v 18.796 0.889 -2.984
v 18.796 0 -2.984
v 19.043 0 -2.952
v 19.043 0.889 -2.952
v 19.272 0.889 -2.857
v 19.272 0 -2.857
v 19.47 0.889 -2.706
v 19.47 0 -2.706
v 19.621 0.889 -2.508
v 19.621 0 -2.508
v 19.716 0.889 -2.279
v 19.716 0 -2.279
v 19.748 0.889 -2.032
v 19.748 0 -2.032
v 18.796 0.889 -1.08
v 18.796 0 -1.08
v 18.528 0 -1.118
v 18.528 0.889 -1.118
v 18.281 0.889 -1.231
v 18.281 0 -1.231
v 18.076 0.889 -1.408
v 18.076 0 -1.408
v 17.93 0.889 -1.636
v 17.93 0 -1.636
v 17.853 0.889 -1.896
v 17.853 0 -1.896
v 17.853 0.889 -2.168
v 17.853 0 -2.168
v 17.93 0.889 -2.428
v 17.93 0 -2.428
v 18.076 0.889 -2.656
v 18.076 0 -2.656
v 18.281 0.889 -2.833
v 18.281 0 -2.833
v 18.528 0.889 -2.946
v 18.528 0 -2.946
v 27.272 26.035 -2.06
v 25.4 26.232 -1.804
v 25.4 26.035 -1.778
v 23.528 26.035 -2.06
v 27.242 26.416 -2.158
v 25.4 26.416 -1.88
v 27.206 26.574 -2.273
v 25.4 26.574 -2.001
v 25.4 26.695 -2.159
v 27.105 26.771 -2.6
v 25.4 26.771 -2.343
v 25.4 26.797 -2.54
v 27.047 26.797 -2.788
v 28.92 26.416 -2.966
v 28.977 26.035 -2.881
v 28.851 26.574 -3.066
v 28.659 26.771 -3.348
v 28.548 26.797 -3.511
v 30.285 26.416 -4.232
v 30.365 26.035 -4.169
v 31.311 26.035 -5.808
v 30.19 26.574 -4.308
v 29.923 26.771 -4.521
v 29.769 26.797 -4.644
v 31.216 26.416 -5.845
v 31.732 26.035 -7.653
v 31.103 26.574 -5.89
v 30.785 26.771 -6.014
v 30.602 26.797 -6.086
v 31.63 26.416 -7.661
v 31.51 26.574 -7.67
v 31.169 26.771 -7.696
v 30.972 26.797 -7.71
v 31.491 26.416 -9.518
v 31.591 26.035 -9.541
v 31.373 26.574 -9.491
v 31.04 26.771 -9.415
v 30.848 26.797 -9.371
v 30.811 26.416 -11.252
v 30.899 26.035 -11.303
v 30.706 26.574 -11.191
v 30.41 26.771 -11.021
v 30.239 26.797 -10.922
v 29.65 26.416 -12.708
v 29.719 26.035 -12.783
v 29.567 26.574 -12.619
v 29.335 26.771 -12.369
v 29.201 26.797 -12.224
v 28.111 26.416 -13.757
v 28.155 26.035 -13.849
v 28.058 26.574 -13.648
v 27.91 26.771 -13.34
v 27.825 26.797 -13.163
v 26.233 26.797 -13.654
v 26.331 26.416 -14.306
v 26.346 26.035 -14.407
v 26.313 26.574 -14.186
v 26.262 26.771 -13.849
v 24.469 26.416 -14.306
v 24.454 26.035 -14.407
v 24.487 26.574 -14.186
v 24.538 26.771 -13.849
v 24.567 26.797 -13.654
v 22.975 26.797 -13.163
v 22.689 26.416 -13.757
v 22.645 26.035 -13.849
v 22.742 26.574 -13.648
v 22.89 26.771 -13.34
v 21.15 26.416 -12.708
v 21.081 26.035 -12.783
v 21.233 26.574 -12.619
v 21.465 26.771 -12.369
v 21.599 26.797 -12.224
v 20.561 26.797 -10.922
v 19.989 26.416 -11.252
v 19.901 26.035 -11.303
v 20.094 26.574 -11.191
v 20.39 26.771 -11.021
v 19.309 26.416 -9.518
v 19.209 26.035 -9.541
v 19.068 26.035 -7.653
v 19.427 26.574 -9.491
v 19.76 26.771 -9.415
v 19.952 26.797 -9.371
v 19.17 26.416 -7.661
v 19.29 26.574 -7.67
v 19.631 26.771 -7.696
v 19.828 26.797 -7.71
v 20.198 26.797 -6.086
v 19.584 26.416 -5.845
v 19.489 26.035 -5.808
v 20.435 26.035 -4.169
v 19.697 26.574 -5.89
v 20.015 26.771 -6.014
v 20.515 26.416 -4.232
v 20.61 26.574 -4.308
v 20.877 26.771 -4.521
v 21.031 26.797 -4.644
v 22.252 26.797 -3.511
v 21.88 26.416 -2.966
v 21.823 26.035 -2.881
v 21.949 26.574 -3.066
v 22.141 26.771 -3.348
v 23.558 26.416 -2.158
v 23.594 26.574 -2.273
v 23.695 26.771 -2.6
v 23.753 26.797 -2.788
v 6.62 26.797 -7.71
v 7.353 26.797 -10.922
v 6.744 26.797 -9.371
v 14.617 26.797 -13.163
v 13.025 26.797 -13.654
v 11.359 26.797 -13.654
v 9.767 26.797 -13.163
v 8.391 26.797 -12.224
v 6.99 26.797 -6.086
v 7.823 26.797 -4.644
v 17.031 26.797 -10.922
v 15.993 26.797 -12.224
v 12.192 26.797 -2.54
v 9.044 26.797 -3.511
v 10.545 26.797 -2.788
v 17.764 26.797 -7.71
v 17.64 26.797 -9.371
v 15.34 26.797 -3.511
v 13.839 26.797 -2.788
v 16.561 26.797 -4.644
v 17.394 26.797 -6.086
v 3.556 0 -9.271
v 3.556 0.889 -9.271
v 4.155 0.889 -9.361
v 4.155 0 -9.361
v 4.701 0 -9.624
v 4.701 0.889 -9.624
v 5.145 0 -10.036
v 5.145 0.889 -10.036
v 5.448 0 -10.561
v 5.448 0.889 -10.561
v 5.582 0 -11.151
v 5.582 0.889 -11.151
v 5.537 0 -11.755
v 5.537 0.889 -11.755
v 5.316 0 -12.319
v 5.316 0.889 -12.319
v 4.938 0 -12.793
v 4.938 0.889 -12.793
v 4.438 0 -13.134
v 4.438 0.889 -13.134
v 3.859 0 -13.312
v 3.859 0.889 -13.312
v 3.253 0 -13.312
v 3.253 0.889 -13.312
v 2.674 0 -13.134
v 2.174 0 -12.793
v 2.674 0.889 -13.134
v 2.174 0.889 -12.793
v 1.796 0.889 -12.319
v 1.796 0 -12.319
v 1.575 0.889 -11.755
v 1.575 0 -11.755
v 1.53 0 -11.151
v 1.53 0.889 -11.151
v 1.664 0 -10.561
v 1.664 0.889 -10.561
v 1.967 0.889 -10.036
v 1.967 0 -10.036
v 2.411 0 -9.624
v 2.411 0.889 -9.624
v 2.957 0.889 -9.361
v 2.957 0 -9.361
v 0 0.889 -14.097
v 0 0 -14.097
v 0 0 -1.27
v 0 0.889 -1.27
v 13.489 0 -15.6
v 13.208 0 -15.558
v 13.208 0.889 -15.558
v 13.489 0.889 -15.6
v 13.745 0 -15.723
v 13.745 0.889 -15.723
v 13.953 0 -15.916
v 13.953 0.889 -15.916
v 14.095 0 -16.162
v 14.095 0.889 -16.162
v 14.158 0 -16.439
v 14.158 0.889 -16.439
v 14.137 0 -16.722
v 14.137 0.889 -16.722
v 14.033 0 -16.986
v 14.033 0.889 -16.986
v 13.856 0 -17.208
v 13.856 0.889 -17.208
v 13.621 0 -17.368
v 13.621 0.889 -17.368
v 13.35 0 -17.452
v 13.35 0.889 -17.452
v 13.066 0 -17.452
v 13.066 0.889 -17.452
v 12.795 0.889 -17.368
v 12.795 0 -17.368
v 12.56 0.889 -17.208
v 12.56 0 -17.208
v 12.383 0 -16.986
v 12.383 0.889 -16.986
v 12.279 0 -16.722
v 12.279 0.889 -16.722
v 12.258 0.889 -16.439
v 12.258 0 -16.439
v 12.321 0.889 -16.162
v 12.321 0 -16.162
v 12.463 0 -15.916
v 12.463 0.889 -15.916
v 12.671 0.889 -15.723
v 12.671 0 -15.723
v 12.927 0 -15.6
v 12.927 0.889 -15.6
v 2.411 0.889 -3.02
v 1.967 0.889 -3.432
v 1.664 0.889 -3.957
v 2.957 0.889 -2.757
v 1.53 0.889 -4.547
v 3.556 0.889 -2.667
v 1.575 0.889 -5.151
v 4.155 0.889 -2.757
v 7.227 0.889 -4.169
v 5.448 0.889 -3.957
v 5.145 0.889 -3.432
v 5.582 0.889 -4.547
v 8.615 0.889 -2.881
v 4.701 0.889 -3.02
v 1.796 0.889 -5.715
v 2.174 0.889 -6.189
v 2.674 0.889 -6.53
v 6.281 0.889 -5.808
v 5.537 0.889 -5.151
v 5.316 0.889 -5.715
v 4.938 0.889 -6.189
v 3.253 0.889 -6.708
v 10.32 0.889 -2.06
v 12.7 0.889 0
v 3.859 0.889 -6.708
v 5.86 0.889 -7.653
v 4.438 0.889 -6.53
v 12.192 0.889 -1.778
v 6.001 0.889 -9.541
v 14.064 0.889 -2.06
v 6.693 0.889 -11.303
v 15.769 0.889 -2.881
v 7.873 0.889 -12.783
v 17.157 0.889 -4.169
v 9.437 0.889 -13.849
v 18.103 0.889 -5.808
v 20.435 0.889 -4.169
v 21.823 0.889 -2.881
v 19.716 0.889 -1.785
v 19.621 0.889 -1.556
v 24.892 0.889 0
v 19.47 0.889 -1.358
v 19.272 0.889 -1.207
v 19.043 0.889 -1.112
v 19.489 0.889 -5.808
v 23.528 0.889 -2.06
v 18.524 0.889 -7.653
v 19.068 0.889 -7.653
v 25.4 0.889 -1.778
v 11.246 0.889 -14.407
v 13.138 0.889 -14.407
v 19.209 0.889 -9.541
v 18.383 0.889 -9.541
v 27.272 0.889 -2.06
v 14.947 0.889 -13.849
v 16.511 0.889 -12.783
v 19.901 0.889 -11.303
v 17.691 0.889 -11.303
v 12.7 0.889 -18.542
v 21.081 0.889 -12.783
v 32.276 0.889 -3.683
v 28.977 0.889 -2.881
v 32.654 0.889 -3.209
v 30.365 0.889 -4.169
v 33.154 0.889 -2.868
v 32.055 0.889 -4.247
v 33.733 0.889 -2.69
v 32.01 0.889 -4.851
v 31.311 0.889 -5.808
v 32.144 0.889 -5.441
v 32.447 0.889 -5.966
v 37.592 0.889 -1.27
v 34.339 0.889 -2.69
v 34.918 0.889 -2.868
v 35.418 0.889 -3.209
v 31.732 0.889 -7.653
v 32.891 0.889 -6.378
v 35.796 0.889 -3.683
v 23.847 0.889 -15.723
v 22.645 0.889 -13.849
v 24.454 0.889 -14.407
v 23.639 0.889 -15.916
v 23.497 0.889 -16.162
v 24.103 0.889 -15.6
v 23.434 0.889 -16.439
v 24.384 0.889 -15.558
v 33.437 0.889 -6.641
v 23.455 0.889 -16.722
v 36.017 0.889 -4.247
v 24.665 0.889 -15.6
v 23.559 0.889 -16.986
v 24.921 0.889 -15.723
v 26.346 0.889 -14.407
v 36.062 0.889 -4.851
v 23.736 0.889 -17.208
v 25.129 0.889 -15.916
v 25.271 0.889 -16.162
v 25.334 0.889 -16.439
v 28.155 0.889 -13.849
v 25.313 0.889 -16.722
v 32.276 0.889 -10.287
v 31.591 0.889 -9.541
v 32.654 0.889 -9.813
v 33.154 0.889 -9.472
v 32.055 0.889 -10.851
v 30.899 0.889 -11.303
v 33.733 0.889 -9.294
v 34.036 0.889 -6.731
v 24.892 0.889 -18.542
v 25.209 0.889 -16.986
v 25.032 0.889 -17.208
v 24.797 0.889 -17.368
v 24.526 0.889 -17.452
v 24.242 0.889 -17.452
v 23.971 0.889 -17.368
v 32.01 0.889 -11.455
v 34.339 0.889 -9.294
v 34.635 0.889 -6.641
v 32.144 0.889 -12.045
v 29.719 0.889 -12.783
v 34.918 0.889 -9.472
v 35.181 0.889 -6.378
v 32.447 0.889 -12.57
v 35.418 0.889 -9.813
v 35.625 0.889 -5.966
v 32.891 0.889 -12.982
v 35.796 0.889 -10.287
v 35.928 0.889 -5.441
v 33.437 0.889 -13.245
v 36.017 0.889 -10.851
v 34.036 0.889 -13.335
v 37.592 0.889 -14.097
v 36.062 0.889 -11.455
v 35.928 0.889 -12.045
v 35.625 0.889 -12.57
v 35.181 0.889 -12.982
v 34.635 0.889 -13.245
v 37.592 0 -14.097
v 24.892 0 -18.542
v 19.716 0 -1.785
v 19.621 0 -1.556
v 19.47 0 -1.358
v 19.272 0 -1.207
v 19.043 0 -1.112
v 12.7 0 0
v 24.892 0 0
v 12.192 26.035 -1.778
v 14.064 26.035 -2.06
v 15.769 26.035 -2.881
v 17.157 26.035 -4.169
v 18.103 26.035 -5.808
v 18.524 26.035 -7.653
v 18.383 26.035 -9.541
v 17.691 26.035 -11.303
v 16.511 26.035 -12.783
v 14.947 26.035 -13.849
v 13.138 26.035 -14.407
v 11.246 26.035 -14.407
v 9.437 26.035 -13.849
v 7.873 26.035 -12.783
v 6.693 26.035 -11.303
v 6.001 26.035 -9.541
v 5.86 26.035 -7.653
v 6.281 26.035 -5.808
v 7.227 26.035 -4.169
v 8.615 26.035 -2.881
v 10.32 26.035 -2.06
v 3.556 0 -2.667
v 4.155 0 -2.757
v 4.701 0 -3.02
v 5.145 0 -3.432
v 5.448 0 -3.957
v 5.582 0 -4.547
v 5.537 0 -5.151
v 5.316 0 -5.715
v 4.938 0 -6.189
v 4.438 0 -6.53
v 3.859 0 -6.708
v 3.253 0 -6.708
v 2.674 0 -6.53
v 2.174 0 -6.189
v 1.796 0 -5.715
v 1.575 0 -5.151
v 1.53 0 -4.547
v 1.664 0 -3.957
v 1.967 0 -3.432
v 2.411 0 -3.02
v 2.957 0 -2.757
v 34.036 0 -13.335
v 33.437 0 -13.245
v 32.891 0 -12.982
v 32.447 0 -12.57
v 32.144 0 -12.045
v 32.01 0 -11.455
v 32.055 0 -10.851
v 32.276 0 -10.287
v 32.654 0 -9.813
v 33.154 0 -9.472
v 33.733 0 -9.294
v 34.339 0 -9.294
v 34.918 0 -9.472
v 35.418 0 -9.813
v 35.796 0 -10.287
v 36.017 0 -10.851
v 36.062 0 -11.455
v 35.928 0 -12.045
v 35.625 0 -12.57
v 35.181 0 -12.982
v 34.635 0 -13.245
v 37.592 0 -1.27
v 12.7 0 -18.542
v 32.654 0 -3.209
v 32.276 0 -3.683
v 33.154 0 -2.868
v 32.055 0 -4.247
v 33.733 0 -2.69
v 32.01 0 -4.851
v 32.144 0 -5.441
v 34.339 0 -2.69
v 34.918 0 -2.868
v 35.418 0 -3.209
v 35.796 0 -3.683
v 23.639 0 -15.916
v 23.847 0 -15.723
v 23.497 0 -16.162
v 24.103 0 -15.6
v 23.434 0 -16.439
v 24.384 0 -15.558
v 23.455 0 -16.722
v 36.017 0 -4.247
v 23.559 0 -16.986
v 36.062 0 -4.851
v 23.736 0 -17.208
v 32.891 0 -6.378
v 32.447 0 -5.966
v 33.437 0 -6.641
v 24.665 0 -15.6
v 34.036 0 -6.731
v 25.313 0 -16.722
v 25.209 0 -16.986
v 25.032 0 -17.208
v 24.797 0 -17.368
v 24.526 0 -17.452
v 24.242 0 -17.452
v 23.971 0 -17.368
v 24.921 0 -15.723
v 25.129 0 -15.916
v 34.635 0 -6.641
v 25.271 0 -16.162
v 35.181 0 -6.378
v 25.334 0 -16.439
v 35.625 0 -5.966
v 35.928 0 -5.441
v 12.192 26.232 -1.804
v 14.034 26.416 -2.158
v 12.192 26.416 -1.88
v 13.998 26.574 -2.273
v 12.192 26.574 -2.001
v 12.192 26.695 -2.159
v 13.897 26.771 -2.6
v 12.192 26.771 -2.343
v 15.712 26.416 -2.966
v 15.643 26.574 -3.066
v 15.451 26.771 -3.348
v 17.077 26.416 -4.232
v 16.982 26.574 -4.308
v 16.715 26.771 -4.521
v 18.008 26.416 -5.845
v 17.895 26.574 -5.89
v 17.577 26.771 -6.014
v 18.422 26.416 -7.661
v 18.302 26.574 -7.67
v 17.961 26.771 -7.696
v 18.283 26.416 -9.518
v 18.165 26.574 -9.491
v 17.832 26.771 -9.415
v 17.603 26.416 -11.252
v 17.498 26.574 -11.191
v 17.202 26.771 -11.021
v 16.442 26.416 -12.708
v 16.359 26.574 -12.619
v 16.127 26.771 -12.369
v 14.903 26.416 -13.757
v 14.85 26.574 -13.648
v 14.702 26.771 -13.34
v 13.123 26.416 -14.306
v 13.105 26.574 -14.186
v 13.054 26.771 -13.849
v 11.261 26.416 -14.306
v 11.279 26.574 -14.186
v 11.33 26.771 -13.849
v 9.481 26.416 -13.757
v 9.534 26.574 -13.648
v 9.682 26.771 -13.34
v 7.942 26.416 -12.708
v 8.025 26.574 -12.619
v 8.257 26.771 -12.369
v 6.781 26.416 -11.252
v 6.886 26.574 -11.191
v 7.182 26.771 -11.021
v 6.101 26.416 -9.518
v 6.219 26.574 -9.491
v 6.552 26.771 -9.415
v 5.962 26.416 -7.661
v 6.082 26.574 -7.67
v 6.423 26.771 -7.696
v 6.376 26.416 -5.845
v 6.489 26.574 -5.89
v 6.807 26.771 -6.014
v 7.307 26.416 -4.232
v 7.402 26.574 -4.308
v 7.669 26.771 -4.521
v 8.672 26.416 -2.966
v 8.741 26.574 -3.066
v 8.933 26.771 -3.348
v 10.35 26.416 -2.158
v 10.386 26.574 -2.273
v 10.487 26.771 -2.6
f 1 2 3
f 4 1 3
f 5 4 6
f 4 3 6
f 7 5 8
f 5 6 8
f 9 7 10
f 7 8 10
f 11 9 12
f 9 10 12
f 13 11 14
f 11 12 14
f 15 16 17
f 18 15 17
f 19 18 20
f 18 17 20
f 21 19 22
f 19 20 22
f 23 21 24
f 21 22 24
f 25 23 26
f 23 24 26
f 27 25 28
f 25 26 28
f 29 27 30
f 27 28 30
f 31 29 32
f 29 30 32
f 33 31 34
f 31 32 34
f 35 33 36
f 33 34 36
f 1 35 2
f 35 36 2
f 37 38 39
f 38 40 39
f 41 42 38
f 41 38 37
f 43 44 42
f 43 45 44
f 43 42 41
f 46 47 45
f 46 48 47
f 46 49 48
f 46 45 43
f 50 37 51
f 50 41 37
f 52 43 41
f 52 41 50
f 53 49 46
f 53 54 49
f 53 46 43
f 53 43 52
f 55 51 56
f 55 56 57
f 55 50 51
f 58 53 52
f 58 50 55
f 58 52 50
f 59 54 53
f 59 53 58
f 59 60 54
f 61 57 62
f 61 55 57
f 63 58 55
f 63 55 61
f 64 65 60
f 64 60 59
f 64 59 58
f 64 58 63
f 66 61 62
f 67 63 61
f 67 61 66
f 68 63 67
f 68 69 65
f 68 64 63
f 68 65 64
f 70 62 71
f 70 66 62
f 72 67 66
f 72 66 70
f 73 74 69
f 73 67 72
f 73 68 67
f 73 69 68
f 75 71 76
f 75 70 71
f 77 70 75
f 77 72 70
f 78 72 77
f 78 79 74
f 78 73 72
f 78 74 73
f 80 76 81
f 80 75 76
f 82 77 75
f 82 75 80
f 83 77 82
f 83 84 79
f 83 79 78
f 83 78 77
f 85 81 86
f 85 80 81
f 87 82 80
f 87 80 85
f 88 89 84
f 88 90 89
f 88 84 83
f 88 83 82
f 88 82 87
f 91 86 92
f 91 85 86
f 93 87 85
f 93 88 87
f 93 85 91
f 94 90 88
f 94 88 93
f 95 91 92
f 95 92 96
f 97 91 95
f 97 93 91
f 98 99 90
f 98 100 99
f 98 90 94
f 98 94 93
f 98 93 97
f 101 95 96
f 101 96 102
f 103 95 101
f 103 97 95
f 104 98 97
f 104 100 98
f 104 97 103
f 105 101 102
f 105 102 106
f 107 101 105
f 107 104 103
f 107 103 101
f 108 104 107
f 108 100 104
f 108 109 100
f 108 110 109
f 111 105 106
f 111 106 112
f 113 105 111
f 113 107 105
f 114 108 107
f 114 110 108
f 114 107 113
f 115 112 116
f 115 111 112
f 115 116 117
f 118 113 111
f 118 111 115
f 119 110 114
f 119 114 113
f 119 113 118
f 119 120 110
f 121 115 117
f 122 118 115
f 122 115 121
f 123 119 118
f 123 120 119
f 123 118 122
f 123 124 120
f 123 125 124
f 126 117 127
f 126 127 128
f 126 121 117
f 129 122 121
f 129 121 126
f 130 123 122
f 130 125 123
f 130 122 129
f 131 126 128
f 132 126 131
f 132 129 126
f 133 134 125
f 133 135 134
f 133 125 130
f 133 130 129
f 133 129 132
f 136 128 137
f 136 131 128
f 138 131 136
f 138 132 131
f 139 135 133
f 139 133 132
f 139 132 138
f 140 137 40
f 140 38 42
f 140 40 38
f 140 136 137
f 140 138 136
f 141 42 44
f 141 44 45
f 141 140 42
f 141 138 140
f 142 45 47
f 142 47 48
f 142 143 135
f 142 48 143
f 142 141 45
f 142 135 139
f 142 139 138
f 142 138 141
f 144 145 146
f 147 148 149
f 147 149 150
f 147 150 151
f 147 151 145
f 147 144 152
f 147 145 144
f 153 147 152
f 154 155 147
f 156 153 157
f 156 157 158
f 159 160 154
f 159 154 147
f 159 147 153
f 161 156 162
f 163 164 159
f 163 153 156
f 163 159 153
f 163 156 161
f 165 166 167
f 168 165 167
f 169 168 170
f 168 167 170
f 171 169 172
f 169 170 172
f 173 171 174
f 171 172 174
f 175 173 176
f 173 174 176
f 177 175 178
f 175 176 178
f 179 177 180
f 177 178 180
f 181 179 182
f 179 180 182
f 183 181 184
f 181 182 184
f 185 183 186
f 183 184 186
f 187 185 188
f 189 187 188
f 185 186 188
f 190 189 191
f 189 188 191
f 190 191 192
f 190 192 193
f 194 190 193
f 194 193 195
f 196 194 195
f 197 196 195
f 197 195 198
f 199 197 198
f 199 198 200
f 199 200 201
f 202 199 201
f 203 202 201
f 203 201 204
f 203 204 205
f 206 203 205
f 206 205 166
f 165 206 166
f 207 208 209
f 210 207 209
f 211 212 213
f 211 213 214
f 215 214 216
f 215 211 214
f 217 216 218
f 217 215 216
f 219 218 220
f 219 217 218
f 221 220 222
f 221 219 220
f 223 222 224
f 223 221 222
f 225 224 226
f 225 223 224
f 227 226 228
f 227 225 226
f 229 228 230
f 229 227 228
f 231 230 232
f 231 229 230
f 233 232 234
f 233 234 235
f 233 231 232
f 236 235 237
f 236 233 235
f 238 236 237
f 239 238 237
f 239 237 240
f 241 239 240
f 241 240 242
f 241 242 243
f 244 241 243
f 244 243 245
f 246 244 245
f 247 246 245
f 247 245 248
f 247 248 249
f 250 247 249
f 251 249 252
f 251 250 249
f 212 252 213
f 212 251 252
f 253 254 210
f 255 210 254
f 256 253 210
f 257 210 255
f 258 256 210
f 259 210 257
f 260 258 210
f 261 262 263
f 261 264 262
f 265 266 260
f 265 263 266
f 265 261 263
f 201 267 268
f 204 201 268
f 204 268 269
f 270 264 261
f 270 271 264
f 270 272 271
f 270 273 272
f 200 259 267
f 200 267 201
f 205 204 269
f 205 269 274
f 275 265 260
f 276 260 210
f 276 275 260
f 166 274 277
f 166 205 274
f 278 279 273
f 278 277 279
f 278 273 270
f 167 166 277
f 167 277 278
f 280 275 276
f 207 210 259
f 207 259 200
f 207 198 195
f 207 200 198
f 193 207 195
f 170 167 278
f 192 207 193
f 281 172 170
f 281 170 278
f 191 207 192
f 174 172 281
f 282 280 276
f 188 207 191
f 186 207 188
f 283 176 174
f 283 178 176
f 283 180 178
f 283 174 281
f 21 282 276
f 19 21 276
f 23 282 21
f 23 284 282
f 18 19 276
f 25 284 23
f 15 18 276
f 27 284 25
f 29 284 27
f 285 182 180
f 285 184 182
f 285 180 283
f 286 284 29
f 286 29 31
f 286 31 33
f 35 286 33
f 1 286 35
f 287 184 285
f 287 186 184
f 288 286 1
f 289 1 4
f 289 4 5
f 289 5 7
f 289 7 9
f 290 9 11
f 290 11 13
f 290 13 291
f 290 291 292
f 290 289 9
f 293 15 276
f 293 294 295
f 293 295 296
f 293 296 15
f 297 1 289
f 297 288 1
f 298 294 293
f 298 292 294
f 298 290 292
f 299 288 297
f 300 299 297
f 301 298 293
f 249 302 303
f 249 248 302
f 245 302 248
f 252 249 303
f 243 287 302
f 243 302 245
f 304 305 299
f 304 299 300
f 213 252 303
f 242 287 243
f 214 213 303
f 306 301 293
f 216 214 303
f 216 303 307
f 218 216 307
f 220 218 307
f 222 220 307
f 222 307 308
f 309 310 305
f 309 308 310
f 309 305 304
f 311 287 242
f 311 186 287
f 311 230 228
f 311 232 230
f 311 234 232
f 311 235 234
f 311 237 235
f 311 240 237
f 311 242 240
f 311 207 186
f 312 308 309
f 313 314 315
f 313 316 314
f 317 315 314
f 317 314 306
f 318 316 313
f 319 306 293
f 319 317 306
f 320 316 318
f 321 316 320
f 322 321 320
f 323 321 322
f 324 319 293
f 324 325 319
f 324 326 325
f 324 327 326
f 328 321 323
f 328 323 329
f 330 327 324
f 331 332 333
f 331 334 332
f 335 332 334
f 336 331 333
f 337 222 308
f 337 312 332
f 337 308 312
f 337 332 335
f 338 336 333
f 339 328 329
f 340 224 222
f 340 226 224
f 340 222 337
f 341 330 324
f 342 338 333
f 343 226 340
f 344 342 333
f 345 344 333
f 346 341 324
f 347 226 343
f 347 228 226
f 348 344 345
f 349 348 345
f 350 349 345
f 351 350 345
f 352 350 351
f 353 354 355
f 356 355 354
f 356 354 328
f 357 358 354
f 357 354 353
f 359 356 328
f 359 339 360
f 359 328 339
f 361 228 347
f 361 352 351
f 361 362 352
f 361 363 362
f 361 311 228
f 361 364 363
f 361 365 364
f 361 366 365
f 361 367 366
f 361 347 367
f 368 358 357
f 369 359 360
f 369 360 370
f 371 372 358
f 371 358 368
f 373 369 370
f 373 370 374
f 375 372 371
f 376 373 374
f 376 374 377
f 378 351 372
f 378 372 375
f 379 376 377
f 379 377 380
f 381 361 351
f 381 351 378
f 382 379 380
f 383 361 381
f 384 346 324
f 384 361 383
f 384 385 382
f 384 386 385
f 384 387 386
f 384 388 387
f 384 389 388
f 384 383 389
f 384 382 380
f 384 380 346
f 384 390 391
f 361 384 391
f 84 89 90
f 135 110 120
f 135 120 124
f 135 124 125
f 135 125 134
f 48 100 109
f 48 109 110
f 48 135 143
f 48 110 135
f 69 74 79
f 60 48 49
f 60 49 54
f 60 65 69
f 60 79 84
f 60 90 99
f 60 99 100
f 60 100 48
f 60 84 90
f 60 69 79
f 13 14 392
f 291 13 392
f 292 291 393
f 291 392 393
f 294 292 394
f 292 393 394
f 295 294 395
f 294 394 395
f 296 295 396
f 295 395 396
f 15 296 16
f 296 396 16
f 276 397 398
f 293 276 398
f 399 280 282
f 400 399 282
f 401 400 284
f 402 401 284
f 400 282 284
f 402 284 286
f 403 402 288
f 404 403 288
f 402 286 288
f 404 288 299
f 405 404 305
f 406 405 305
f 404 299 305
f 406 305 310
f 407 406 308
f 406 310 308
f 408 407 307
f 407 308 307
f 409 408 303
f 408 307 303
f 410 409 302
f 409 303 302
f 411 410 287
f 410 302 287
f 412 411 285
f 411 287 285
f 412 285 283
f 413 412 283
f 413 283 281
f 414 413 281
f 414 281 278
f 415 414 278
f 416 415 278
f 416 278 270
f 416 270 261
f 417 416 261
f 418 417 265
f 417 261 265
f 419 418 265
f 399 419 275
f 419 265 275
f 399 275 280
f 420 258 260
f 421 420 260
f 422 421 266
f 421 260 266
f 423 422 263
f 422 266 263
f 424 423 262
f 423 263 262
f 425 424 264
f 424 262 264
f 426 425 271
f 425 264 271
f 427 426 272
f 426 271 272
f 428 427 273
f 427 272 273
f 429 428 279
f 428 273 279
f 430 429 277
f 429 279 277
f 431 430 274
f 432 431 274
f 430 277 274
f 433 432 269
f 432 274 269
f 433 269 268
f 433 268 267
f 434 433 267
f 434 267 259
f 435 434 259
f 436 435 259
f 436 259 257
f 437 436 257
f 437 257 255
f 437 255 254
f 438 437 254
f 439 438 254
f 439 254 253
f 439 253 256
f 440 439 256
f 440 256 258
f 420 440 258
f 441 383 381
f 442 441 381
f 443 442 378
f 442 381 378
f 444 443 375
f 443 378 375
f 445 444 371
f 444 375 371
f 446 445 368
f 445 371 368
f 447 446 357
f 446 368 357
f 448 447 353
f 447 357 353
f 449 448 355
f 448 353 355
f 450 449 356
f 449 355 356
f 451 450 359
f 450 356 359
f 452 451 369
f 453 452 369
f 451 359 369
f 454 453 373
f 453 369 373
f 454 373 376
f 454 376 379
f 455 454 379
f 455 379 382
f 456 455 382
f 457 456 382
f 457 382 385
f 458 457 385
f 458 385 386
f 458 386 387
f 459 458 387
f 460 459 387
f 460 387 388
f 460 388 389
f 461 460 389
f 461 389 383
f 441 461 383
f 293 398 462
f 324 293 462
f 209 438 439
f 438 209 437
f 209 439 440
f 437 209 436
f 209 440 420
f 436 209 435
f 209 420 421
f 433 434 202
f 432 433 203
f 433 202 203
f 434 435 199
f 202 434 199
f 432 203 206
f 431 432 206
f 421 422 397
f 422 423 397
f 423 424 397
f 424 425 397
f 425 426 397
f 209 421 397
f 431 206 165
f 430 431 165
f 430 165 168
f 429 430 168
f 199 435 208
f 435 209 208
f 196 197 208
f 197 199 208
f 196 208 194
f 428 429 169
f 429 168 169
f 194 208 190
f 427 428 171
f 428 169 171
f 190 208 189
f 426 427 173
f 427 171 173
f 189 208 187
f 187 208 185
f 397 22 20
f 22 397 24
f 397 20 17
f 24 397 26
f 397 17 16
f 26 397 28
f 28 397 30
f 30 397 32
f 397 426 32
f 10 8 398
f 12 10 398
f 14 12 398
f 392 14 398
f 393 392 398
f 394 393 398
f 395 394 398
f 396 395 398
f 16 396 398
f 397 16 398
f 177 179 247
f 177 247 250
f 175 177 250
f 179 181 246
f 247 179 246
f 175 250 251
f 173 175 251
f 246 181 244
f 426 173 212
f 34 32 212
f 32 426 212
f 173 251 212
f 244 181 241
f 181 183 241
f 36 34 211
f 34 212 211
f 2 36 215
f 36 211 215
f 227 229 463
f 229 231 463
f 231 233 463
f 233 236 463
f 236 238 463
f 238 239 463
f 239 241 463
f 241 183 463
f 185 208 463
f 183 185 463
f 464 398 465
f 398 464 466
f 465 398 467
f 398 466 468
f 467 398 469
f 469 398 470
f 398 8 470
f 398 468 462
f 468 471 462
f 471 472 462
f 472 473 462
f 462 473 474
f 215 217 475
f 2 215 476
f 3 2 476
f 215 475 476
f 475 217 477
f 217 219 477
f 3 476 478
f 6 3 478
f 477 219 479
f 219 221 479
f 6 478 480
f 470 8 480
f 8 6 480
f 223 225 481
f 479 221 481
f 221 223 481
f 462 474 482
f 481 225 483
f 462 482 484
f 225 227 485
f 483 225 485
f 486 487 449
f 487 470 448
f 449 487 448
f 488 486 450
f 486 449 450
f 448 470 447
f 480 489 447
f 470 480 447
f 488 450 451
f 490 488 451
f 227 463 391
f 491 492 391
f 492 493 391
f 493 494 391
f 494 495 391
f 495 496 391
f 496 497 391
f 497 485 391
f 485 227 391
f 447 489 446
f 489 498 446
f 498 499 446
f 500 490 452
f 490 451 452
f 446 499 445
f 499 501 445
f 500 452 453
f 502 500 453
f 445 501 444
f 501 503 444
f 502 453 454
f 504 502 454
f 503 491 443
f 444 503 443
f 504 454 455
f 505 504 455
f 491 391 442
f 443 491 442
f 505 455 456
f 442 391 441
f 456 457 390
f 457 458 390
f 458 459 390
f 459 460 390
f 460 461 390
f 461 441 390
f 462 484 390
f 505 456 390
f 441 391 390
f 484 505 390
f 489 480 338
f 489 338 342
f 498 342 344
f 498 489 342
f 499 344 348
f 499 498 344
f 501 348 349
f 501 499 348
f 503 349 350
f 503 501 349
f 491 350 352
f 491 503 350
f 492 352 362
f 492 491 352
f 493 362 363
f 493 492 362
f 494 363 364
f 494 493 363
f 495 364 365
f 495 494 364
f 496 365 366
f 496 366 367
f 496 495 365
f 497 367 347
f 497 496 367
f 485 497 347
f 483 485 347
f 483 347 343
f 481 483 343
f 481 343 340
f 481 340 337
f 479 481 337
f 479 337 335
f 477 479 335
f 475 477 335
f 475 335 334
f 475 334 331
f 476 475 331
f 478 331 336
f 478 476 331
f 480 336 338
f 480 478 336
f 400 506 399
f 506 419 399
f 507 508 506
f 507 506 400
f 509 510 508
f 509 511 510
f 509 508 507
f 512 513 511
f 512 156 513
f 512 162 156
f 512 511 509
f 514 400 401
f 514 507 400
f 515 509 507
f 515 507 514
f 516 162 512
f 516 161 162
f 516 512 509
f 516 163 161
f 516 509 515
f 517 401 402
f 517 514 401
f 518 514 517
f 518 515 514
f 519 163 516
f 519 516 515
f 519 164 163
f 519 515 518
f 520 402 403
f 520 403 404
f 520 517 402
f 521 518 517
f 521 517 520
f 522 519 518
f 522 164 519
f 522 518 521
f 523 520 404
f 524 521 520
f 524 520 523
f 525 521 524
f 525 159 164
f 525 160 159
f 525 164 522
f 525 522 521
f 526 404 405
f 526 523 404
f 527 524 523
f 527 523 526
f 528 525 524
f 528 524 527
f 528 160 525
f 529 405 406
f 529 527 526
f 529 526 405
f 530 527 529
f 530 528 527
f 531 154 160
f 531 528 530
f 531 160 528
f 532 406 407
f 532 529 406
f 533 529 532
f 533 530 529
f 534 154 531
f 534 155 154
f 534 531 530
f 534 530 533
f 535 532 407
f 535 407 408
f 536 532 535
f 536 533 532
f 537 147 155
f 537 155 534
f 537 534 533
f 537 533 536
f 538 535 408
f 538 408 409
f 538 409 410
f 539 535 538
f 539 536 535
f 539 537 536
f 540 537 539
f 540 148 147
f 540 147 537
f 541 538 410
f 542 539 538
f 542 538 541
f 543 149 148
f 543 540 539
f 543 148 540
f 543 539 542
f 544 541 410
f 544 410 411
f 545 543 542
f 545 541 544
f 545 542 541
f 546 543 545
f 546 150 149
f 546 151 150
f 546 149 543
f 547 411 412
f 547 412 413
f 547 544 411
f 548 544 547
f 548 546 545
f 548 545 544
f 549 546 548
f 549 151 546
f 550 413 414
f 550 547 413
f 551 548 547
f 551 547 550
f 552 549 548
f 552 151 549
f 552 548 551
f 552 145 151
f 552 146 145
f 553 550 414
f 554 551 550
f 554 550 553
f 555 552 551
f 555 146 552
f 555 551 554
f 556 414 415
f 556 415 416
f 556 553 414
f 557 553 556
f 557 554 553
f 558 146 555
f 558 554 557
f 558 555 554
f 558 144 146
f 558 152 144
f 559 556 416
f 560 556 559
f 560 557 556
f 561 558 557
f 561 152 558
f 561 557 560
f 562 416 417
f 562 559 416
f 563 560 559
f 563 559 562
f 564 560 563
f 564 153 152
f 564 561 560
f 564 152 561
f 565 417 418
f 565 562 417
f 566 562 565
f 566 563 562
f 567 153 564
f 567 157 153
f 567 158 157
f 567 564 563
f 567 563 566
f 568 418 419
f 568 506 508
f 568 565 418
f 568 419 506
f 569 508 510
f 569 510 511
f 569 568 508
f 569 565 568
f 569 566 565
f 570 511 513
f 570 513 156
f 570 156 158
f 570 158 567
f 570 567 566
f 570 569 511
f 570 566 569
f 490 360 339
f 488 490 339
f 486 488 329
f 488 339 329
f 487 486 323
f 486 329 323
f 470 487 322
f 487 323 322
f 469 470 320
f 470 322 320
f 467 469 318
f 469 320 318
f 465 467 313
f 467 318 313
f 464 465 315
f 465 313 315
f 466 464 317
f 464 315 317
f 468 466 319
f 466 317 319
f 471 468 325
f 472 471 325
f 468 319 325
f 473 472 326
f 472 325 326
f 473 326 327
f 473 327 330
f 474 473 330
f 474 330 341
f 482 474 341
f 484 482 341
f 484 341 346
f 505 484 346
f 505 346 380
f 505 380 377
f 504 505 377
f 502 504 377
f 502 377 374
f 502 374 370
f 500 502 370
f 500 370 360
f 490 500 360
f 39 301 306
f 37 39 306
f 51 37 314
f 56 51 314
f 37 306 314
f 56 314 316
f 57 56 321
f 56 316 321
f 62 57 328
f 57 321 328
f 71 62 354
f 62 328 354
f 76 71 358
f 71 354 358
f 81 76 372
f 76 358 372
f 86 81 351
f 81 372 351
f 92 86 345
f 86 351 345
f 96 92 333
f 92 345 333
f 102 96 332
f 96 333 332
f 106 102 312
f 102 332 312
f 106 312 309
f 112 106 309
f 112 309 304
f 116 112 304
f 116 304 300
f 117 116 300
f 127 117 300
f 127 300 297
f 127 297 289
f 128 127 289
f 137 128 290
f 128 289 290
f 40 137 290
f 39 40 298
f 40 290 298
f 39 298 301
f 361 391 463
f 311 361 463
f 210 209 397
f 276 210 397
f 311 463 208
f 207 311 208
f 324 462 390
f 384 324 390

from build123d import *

# Parameters (mm, degrees)
SKETCH1_R           = 0.9525
BOSS_EXTRUDE1_DEPTH = 0.889
SKETCH3_R           = 6.35
BOSS_EXTRUDE2_DEPTH = 25.908
SKETCH2_R           = 2.032
CUT_EXTRUDE1_DEPTH  = 50.276654635
FILLET1_R           = 0.762


with BuildPart() as part:
    # Sketch1 → Boss-Extrude1 (new body)
    # profile 1 of 2: a face of its own
    with BuildSketch(Plane(origin=(0, 0, 0), x_dir=(1, 0, 0), z_dir=(0, 1, 0))):
        with BuildLine():
            Line((18.796, 2.9845), (18.796, 18.542))
            Line((18.796, 18.542), (12.7, 18.542))
            Line((12.7, 18.542), (0, 14.097))
            Line((0, 14.097), (0, 1.27))
            Line((0, 1.27), (12.7, 0))
            Line((12.7, 0), (18.796, 0))
            Line((18.796, 0), (18.796, 1.0795))
            ThreePointArc((18.796, 1.0795), (17.8435, 2.032), (18.796, 2.9845))
        make_face()
        with Locations(Location((13.208, 16.51, 0), (0, 0, 270))):
            Circle(SKETCH1_R, mode=Mode.SUBTRACT)
    # profile 2 of 2: a face of its own
    with BuildSketch(Plane(origin=(0, 0, 0), x_dir=(1, 0, 0), z_dir=(0, 1, 0))):
        with BuildLine():
            Line((24.892, 18.542), (18.796, 18.542))
            Line((18.796, 18.542), (18.796, 2.9845))
            ThreePointArc((18.796, 2.9845), (19.469519209, 2.705519209), (19.7485, 2.032))
            ThreePointArc((19.7485, 2.032), (19.469519209, 1.358480791), (18.796, 1.0795))
            Line((18.796, 1.0795), (18.796, 0))
            Line((18.796, 0), (24.892, 0))
            Line((24.892, 0), (37.592, 1.27))
            Line((37.592, 1.27), (37.592, 14.097))
            Line((37.592, 14.097), (24.892, 18.542))
        make_face()
        with Locations(Location((24.384, 16.51, 0), (0, 0, 270))):
            Circle(SKETCH1_R, mode=Mode.SUBTRACT)
    extrude(amount=BOSS_EXTRUDE1_DEPTH)

    # Sketch3 → Boss-Extrude2 (add)
    with BuildSketch(Plane(origin=(0, 0.889, 0), x_dir=(1, 0, 0), z_dir=(0, 1, 0))):
        with Locations(Location((12.192, 8.128, 0), (0, 0, 270))):
            Circle(SKETCH3_R)
        with Locations(Location((25.4, 8.128, 0), (0, 0, 270))):
            Circle(SKETCH3_R)
    extrude(amount=BOSS_EXTRUDE2_DEPTH)

    # Sketch2 → Cut-Extrude1 (cut, through all)
    with BuildSketch(Plane(origin=(0, 0.889, 0), x_dir=(1, 0, 0), z_dir=(0, 1, 0))):
        with Locations(Location((3.556, 11.303, 0), (0, 0, 270))):
            Circle(SKETCH2_R)
        with Locations(Location((3.556, 4.699, 0), (0, 0, 270))):
            Circle(SKETCH2_R)
        with Locations(Location((34.036, 4.699, 0), (0, 0, 90))):
            Circle(SKETCH2_R)
        with Locations(Location((34.036, 11.303, 0), (0, 0, 90))):
            Circle(SKETCH2_R)
    extrude(amount=-CUT_EXTRUDE1_DEPTH, mode=Mode.SUBTRACT)

    # Fillet1
    fillet1_edges = [part.edges().sort_by_distance(p)[0] for p in [
        (12.192, 26.797, -14.478),
        (25.4, 26.797, -14.478),
    ]]
    fillet(fillet1_edges, radius=FILLET1_R)


solid = part.part
